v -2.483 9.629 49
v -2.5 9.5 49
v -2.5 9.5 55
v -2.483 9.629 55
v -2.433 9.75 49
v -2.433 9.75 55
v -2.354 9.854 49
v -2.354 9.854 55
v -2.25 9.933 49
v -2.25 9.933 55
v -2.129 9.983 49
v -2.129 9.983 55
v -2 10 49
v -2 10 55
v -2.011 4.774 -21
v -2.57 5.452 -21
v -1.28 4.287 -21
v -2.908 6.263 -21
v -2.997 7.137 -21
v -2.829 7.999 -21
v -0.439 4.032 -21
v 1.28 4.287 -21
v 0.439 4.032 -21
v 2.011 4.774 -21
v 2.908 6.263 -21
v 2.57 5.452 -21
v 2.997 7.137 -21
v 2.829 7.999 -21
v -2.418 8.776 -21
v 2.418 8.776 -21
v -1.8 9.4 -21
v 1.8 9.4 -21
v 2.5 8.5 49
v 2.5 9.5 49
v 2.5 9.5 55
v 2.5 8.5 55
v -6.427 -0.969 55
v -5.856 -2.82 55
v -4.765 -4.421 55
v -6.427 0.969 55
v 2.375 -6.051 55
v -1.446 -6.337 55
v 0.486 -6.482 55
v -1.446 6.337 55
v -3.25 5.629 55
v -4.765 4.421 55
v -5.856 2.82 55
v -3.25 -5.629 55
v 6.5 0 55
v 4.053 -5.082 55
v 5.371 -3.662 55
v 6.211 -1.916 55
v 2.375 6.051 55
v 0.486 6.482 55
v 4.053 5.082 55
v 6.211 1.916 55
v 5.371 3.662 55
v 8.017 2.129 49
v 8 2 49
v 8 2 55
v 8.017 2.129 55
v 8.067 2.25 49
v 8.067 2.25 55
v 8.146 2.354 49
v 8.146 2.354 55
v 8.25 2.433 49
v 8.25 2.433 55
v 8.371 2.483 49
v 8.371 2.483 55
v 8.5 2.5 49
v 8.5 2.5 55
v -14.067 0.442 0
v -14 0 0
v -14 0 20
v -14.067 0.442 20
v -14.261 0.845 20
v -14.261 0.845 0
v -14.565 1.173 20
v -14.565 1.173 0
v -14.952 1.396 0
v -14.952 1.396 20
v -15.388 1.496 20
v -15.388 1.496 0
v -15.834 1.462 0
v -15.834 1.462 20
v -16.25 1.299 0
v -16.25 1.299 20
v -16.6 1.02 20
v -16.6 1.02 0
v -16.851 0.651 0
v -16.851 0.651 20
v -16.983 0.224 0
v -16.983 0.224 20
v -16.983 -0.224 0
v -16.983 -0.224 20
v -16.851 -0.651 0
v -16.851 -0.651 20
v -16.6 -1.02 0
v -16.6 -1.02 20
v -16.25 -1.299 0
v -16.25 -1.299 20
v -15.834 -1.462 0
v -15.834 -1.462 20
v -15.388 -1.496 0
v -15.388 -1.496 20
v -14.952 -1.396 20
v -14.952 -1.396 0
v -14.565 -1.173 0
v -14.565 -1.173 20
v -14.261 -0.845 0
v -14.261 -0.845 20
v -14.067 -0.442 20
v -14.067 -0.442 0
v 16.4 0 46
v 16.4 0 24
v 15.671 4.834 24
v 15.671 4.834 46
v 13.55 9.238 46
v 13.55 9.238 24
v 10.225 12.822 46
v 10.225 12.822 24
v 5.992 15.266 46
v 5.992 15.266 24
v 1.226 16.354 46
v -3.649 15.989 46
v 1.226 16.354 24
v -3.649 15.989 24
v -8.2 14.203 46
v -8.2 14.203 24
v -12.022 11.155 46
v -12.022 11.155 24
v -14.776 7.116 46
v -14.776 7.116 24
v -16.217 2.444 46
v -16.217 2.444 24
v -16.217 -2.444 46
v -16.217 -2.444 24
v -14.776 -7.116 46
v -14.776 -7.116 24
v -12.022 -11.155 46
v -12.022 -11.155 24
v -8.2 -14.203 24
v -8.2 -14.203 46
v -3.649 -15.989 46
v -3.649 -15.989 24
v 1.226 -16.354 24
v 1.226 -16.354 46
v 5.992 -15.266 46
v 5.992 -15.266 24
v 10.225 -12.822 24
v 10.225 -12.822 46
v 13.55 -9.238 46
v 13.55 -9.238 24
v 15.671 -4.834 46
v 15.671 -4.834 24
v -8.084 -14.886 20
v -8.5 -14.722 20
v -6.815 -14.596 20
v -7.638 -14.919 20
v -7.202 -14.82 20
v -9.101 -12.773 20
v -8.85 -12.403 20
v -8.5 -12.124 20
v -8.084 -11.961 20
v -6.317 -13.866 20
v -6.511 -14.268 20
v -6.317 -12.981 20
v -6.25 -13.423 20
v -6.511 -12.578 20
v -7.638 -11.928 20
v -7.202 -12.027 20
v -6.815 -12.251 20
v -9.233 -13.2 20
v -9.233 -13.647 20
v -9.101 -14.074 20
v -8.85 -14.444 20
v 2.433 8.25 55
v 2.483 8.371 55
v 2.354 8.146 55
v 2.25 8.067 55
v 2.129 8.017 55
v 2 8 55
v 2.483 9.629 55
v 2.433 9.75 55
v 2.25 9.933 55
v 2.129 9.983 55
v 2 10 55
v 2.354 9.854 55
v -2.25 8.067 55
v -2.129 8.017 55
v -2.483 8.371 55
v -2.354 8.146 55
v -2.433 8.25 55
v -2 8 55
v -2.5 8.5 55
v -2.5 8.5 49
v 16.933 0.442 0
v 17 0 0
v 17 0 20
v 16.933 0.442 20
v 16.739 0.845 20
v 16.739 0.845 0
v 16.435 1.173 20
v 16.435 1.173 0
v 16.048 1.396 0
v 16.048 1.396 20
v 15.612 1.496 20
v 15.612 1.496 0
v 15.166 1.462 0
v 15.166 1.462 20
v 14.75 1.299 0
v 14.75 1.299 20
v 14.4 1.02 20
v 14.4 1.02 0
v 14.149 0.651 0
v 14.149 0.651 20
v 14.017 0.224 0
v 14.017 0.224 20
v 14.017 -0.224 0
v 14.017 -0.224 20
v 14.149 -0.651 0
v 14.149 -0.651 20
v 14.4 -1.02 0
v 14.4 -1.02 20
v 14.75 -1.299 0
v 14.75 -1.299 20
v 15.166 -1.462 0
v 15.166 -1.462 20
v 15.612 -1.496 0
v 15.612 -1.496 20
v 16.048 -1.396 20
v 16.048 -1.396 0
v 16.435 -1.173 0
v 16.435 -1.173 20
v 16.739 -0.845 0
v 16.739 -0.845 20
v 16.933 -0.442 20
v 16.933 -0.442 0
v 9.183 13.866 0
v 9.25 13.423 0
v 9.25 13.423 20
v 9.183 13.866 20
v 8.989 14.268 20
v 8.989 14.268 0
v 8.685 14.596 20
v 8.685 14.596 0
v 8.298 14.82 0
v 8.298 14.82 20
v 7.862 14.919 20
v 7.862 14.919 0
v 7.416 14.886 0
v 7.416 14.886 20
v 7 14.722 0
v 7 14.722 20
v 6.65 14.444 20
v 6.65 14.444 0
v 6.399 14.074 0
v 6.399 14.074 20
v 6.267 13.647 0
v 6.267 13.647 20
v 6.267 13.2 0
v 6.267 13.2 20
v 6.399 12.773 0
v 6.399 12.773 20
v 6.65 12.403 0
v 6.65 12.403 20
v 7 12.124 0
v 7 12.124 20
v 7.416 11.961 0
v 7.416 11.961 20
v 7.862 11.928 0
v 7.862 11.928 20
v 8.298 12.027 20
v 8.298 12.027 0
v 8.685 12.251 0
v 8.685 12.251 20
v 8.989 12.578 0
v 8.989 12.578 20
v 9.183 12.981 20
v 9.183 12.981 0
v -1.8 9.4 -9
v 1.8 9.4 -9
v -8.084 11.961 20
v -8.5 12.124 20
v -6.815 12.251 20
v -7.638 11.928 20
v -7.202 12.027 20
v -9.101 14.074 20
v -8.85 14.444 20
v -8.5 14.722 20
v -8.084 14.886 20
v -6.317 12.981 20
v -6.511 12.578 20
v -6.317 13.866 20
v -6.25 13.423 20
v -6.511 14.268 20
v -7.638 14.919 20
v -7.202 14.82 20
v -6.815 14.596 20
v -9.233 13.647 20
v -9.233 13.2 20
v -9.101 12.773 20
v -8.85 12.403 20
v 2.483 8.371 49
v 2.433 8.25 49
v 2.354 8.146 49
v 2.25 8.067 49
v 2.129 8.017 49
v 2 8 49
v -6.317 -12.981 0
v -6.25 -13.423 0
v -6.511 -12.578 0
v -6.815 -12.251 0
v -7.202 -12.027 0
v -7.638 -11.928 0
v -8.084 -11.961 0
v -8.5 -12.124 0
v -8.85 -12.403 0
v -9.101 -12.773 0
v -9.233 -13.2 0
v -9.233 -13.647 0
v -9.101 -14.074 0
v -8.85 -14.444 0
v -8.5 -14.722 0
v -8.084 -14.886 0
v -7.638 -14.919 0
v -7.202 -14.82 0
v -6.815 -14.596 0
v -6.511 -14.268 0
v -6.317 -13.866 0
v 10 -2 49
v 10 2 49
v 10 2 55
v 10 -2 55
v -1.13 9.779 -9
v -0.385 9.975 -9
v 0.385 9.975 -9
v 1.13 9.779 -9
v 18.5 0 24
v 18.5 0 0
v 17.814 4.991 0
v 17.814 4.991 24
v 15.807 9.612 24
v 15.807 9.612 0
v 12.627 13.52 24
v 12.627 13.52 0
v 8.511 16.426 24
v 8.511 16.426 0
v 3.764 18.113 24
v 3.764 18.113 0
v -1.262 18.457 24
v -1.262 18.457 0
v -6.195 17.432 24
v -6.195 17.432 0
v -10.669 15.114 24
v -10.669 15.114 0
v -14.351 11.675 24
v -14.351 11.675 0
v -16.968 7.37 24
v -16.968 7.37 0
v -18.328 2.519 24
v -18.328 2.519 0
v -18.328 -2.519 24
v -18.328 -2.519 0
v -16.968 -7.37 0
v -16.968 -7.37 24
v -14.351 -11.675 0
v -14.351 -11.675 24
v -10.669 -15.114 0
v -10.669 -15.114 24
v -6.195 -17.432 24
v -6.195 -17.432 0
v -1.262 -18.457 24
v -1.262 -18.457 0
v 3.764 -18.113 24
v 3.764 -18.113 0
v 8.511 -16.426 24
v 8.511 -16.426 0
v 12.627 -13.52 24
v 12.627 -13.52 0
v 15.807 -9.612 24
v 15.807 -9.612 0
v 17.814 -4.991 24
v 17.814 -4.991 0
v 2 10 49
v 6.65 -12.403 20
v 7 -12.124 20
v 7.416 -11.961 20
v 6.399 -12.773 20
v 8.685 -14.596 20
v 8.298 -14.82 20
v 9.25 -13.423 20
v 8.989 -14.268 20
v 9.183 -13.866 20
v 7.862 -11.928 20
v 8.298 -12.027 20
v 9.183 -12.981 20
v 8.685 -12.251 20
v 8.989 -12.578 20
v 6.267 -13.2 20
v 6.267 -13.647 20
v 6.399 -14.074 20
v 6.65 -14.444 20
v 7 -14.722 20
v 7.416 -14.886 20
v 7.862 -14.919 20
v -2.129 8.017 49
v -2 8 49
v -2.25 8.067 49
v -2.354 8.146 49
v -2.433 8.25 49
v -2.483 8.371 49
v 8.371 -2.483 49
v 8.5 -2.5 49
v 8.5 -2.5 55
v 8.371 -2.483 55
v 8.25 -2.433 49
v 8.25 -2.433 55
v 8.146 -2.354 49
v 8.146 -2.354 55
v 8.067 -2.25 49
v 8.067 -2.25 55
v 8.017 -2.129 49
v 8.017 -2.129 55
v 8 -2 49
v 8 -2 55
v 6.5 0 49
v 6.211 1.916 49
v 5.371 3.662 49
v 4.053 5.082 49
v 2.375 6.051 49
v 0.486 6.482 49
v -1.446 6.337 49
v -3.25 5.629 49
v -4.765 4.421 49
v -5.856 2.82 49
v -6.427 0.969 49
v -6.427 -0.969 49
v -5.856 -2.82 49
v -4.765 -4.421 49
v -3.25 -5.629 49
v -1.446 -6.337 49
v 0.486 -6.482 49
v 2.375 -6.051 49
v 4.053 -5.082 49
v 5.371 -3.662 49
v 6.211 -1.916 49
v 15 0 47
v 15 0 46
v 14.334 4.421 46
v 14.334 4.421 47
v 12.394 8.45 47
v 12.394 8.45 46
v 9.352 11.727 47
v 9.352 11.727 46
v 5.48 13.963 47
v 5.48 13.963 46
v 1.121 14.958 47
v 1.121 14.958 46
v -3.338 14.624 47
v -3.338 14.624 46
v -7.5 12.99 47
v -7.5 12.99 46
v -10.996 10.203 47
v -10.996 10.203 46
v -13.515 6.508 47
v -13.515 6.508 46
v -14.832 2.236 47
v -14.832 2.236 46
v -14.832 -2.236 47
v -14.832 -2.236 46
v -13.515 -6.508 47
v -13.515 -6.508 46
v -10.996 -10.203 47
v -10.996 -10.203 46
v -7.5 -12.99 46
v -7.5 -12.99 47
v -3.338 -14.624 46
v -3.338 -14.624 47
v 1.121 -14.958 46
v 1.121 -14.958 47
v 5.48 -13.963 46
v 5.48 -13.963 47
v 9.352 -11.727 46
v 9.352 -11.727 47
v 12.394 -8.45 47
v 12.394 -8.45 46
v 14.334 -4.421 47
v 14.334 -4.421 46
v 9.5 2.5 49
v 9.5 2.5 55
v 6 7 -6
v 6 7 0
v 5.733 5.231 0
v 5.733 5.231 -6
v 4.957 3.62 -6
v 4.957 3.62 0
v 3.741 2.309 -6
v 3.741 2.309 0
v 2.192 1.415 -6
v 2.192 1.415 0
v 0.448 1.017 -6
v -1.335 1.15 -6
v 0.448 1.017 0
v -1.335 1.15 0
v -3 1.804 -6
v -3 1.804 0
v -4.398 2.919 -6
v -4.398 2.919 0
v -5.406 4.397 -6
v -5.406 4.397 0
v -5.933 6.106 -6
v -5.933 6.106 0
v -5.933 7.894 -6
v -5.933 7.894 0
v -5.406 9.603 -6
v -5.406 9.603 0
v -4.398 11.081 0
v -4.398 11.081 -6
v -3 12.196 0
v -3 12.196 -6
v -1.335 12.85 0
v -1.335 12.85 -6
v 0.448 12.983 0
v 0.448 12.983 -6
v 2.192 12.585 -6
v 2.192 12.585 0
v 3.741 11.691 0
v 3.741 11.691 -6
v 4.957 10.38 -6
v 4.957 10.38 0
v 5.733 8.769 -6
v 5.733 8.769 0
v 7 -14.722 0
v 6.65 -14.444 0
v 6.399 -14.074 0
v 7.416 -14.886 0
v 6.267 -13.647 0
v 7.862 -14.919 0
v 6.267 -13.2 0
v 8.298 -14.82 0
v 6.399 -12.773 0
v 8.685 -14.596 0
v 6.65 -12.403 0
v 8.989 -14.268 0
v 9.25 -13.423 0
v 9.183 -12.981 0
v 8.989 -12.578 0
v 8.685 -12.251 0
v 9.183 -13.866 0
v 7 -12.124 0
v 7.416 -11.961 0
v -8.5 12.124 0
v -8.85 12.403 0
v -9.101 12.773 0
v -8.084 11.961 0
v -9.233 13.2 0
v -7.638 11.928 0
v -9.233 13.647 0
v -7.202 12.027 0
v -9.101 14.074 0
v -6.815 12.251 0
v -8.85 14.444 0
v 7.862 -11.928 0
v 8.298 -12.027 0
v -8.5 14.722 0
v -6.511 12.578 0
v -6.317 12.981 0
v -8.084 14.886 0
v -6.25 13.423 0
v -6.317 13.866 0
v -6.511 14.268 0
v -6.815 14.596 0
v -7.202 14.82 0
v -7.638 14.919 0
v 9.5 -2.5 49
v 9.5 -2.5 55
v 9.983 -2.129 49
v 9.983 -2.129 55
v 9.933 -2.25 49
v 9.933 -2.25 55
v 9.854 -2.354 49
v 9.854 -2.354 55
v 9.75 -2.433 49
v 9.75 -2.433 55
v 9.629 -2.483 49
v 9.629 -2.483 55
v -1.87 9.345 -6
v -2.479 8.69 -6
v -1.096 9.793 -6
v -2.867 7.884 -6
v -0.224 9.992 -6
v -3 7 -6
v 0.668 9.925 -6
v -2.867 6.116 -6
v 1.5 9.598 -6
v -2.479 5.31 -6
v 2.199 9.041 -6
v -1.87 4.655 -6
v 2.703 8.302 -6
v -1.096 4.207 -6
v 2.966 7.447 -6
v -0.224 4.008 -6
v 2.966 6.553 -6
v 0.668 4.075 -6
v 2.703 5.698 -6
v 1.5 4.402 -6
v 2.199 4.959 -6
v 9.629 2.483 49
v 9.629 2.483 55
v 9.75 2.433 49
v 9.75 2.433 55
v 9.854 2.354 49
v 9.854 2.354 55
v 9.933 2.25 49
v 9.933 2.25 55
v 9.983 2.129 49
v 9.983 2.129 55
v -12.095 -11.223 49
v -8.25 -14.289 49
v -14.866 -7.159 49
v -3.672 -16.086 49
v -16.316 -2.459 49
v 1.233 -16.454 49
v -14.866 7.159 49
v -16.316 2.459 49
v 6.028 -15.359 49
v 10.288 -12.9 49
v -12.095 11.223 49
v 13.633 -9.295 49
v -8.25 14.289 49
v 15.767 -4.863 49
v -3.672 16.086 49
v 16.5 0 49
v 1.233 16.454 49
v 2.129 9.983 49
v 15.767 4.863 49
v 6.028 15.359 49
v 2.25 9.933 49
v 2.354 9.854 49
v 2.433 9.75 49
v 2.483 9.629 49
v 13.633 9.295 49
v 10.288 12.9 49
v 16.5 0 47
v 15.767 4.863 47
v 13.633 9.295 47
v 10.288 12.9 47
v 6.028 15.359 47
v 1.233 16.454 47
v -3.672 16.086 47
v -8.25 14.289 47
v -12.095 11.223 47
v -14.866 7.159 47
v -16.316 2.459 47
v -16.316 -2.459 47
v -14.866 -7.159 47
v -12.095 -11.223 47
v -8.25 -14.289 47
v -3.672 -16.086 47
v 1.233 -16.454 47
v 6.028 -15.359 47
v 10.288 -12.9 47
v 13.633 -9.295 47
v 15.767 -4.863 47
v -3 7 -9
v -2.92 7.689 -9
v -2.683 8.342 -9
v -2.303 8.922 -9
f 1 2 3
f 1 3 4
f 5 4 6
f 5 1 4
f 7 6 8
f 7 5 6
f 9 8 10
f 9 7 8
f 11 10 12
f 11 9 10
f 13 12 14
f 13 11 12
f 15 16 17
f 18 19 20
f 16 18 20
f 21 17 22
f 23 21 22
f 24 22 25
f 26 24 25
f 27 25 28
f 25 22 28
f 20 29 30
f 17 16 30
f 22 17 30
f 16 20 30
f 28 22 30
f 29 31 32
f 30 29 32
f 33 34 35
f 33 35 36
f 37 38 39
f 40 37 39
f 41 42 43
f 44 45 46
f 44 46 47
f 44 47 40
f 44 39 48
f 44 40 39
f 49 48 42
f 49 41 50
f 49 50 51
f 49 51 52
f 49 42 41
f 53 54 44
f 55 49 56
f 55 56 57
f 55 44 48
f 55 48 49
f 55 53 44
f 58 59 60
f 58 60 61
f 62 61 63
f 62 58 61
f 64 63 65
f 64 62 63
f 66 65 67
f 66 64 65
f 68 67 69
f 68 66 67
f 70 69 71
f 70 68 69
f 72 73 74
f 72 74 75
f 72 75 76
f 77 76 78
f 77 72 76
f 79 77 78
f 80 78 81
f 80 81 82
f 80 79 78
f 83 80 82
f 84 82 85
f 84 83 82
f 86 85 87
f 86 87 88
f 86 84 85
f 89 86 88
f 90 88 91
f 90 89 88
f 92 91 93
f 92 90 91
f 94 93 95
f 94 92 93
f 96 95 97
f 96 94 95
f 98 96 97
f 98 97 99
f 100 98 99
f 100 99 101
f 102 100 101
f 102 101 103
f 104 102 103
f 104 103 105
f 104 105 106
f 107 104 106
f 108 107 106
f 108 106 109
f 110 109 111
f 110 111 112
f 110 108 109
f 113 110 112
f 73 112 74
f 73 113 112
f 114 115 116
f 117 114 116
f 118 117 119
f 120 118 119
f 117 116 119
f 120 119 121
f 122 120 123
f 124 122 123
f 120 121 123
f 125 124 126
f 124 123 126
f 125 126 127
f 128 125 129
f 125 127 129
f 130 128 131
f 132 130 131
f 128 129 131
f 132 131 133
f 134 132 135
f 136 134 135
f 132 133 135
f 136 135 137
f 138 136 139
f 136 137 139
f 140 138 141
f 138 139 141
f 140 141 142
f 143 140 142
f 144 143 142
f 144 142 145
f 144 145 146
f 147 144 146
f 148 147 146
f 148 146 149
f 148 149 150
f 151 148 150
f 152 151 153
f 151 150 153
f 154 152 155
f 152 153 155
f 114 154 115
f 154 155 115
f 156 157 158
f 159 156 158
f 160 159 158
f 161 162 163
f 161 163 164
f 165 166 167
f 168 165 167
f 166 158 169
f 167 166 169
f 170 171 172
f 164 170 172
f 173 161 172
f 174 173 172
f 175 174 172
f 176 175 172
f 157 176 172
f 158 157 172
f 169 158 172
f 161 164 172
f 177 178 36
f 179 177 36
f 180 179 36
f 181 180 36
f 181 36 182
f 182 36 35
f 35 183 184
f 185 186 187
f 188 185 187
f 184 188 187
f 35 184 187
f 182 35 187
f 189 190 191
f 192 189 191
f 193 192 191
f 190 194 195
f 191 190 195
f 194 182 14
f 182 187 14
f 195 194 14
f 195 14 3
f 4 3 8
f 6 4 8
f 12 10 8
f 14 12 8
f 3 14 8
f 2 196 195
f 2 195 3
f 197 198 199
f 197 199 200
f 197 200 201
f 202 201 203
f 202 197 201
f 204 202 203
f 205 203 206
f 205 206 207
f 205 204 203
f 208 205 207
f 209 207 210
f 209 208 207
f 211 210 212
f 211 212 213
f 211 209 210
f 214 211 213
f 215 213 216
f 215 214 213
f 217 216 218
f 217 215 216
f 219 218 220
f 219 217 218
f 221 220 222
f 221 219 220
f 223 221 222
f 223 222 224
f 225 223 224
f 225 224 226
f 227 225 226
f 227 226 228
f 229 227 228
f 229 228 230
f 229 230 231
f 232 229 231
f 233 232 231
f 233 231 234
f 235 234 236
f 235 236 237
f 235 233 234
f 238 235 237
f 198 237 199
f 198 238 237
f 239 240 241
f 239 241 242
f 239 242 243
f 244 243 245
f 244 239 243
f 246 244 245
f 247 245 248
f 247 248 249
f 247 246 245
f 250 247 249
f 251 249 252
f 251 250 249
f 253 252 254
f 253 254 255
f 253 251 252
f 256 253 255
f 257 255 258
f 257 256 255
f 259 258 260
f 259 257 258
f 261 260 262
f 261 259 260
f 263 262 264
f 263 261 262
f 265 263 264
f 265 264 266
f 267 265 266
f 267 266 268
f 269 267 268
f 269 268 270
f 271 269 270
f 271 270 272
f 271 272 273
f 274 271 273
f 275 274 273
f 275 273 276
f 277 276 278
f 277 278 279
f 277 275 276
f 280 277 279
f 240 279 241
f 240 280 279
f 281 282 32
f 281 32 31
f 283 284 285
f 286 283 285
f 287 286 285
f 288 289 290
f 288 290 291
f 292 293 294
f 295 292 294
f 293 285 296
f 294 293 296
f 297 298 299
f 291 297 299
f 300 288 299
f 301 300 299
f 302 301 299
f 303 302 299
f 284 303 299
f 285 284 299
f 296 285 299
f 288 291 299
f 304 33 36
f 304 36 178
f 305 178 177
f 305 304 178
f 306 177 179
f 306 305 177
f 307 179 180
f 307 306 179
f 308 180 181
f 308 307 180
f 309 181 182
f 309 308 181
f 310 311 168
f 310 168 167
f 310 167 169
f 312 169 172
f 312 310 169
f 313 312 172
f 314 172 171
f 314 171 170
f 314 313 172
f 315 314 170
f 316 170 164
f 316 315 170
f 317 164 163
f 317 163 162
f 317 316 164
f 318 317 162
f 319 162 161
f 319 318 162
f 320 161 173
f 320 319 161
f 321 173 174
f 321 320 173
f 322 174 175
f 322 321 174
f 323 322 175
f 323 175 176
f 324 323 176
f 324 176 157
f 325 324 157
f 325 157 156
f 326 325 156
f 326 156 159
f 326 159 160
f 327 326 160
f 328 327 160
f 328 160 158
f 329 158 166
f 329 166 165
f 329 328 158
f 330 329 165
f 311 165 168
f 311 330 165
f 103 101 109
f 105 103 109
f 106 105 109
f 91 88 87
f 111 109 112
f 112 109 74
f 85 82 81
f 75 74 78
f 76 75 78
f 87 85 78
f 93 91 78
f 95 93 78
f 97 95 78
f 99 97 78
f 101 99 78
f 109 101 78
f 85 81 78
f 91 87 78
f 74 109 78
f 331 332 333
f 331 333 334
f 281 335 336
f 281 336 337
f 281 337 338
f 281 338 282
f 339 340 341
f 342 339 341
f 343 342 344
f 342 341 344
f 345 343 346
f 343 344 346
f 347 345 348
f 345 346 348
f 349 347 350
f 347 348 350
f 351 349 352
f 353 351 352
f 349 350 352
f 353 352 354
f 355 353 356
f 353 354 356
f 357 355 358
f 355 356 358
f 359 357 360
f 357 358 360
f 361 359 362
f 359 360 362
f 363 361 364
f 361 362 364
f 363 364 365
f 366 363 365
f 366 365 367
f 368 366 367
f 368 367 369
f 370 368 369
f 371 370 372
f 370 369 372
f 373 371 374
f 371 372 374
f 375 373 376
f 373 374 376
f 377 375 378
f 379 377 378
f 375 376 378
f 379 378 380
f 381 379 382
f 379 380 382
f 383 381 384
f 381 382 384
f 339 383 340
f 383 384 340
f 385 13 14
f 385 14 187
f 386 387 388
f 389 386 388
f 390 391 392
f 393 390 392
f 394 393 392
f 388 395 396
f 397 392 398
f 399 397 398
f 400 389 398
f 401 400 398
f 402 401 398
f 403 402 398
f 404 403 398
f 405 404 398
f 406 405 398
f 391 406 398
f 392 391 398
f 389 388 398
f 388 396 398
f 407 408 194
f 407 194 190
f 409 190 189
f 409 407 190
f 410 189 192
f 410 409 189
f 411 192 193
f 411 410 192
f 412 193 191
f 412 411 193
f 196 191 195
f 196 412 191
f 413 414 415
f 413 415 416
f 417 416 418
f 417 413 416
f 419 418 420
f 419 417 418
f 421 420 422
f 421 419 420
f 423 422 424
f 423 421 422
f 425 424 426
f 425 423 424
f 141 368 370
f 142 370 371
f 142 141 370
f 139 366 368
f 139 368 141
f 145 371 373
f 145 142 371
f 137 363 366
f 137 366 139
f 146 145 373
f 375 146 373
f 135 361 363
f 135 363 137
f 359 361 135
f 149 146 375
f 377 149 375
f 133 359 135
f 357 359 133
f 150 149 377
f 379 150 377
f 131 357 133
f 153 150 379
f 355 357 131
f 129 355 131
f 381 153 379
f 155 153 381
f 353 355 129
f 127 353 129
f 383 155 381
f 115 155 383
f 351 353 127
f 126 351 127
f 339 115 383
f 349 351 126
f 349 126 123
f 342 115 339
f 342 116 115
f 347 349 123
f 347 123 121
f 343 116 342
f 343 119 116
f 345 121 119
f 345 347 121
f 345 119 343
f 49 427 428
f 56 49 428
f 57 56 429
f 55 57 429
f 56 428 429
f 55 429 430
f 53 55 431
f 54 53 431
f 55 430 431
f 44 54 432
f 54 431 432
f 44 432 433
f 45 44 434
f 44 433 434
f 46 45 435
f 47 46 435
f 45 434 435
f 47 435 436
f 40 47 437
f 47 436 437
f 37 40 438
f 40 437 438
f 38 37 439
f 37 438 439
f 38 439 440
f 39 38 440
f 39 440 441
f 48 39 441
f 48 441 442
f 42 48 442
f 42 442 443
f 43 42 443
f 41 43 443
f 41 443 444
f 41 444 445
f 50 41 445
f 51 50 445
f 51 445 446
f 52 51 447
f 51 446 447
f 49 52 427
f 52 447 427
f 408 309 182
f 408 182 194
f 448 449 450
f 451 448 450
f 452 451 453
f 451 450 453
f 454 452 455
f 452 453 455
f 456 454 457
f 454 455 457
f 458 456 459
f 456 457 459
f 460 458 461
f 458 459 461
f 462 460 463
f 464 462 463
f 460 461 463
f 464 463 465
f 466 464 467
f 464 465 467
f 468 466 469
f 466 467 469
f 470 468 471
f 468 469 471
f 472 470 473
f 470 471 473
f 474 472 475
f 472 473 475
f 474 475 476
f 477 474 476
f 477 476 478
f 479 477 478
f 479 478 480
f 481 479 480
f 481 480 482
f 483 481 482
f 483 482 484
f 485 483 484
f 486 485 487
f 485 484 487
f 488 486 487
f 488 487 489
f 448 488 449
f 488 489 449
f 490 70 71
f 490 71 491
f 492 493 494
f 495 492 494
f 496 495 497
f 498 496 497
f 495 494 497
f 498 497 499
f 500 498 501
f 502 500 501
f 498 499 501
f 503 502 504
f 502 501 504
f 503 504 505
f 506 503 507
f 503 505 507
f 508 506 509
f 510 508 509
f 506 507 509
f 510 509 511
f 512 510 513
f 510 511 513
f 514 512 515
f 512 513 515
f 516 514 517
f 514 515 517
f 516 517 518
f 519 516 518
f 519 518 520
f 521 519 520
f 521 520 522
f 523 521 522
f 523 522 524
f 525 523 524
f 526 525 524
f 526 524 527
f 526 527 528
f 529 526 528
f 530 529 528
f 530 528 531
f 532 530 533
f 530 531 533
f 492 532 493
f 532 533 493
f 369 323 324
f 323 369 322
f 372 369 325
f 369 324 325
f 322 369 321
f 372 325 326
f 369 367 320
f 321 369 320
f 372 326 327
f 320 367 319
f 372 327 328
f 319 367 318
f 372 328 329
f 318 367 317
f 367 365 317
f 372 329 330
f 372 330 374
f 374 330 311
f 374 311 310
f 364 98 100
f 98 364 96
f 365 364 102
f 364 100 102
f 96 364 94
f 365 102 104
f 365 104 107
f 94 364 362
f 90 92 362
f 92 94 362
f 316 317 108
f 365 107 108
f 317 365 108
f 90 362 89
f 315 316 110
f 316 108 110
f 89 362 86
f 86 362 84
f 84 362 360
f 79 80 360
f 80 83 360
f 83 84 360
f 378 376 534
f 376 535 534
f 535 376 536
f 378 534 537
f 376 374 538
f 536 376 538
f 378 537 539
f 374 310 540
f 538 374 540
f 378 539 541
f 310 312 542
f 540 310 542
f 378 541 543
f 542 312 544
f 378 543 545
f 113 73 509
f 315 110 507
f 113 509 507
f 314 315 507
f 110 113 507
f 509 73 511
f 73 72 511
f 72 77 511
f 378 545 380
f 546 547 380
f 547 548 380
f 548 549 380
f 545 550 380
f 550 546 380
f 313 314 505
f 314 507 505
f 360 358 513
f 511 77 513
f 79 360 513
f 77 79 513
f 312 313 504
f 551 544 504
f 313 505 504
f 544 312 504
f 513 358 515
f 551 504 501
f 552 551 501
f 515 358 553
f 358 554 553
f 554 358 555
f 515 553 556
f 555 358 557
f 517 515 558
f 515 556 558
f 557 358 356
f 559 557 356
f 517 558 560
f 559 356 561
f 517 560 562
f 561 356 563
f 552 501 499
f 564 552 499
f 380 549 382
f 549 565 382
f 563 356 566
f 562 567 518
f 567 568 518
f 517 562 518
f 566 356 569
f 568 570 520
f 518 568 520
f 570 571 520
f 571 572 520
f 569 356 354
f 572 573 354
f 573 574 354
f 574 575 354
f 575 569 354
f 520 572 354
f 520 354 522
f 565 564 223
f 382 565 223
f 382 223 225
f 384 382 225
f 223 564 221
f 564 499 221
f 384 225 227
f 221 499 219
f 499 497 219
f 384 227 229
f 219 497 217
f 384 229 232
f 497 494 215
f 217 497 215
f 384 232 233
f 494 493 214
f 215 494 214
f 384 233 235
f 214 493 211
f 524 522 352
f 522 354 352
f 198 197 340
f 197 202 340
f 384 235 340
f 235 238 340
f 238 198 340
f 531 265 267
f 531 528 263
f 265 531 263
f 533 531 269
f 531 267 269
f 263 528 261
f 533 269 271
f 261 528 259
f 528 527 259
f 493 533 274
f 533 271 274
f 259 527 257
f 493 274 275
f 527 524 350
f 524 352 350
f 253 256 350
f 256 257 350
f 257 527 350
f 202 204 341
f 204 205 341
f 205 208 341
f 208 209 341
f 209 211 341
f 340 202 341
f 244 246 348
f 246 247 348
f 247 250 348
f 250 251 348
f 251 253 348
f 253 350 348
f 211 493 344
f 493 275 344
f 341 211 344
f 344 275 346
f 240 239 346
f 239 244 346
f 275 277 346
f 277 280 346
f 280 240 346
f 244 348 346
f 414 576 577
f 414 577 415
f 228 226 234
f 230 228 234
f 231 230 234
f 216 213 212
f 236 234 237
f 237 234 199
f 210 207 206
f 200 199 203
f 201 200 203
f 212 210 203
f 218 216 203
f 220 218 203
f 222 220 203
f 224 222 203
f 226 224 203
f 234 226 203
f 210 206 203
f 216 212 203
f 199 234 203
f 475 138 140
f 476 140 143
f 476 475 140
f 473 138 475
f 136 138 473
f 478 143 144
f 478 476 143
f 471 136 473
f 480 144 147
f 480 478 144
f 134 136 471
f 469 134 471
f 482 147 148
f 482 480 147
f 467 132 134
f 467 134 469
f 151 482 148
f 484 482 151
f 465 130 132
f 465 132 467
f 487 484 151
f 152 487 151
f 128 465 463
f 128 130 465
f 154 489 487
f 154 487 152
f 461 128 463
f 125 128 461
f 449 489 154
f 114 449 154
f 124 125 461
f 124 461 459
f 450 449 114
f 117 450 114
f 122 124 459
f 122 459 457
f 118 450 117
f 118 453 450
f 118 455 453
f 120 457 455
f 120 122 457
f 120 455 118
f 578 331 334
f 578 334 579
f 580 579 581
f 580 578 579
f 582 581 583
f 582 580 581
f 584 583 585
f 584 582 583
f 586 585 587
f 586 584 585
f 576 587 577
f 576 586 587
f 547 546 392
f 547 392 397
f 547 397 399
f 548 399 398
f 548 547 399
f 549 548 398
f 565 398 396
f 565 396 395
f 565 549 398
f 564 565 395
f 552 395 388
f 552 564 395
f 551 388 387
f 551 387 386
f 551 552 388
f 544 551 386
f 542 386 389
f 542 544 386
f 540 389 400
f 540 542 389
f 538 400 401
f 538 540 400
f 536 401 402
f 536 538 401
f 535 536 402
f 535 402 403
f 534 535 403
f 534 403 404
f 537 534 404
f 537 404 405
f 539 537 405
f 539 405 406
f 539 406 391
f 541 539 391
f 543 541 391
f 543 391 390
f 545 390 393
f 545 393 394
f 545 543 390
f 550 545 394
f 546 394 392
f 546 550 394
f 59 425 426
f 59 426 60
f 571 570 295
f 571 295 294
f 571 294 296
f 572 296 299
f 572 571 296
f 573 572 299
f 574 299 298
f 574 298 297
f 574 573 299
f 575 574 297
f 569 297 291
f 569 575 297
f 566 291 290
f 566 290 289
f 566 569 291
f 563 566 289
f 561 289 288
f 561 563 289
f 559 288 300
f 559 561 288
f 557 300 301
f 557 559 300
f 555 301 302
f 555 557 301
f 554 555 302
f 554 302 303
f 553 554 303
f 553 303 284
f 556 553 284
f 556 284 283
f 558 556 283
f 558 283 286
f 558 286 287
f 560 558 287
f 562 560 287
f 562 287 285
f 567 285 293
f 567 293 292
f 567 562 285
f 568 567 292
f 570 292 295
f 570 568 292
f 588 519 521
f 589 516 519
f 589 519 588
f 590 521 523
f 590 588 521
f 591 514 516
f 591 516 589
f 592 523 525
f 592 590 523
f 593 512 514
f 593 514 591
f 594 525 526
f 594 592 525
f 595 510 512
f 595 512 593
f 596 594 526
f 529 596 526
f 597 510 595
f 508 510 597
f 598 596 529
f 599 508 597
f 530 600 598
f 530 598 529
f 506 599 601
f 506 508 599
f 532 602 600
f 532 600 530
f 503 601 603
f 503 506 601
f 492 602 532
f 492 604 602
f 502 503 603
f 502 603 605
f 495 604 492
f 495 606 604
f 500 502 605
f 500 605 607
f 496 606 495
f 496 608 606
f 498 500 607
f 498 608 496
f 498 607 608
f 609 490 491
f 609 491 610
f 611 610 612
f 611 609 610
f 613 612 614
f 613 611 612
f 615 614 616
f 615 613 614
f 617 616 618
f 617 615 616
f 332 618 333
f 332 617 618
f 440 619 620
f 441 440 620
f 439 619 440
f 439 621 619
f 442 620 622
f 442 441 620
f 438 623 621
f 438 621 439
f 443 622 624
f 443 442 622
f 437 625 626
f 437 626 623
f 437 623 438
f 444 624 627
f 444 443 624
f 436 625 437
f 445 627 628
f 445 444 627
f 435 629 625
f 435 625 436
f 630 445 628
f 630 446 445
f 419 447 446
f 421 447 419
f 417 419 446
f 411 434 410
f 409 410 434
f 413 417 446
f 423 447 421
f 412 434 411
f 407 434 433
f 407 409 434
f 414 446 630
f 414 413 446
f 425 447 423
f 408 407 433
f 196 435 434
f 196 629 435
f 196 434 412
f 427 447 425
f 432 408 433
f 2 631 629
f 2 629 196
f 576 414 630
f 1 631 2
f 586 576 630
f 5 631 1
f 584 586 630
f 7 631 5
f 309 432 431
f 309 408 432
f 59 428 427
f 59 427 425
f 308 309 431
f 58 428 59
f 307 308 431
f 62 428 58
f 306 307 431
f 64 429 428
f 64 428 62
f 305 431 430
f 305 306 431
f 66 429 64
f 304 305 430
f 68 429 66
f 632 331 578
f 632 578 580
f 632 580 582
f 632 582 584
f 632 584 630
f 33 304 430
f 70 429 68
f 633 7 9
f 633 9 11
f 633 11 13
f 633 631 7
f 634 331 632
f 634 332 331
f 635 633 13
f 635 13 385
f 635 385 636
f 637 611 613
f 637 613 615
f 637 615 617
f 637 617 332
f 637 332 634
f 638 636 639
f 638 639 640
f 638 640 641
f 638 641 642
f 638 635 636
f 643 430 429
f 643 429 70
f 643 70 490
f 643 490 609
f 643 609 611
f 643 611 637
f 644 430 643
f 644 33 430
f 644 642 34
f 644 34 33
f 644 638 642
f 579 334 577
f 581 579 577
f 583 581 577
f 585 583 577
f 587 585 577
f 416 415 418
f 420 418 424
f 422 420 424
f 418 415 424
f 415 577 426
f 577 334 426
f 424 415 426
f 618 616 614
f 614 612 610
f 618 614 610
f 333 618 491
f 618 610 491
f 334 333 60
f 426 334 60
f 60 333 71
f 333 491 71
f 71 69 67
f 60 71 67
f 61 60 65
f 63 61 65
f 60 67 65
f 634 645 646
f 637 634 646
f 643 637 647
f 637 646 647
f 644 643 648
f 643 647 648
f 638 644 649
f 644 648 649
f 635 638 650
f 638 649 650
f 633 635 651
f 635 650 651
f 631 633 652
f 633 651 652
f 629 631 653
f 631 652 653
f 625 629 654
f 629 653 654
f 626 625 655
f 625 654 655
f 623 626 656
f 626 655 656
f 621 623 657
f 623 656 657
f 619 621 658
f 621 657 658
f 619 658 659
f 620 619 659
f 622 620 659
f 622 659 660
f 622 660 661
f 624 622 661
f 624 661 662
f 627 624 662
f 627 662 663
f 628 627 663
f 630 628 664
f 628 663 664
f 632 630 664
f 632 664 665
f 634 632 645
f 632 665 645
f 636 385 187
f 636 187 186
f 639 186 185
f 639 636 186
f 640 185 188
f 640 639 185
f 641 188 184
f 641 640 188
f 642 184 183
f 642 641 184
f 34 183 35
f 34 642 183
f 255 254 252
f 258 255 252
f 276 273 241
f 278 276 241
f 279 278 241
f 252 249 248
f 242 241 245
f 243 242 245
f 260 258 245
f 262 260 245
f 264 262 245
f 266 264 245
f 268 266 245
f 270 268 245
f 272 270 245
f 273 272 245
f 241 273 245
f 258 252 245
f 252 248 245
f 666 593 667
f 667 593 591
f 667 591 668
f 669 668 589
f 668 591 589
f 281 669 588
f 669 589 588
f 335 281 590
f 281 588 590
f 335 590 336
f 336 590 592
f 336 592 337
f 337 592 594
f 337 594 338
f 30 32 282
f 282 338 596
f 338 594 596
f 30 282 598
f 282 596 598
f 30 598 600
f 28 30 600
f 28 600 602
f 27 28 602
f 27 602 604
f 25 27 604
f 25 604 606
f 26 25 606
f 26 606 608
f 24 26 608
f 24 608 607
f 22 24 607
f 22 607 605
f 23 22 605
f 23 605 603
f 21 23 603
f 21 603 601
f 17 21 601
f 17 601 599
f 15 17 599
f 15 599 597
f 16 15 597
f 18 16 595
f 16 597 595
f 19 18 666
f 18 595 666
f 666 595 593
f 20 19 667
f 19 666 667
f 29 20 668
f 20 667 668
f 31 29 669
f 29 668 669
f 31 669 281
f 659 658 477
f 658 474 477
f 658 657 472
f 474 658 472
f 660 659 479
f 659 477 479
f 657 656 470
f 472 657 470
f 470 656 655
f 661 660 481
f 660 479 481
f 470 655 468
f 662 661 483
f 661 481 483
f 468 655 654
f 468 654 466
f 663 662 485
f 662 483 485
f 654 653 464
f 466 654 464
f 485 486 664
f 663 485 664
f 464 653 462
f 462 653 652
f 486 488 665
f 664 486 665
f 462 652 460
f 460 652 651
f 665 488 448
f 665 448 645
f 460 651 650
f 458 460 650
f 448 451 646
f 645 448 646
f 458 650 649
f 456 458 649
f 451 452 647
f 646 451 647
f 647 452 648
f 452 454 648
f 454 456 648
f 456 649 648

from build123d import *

# Parameters (mm, degrees)
SKETCH_1_R          = 18.5
EXTRUDE_1_DEPTH     = 24
SKETCH_1_3_R        = 1.5
CUT_EXTRUDE_1_DEPTH = 20
SKETCH_3_R          = 16.4
EXTRUDE_3_DEPTH     = 22
SKETCH_4_R          = 6
EXTRUDE_4_DEPTH     = 6
SKETCH_5_R          = 3
EXTRUDE_5_DEPTH     = 3
EXTRUDE_6_DEPTH     = 12
SKETCH_7_R          = 15
EXTRUDE_7_DEPTH     = 1
SKETCH_8_R          = 16.5
EXTRUDE_8_DEPTH     = 2
SKETCH_9_R          = 6.5
EXTRUDE_9_DEPTH     = 6


with BuildPart() as part:
    # 草图1 → 凸台-拉伸1 (new body)
    with BuildSketch(Plane.XY):
        Circle(SKETCH_1_R)
    extrude(amount=EXTRUDE_1_DEPTH)

    # 草图1<3> → 切除-拉伸1 (cut)
    with BuildSketch(Plane.XY):
        with Locations((-15.5, 0)):
            Circle(SKETCH_1_3_R)
        with Locations((-7.75, 13.423393759)):
            Circle(SKETCH_1_3_R)
        with Locations((-7.75, -13.423393759)):
            Circle(SKETCH_1_3_R)
        with Locations((7.75, 13.423393759)):
            Circle(SKETCH_1_3_R)
        with Locations((15.5, 0)):
            Circle(SKETCH_1_3_R)
        with Locations((7.75, -13.423393759)):
            Circle(SKETCH_1_3_R)
    extrude(amount=CUT_EXTRUDE_1_DEPTH, mode=Mode.SUBTRACT)

    # 草图3 → 凸台-拉伸3 (add)
    with BuildSketch(Plane.XY.offset(24)):
        Circle(SKETCH_3_R)
    extrude(amount=EXTRUDE_3_DEPTH)

    # 草图4 → 凸台-拉伸4 (add)
    with BuildSketch(Plane(origin=(0, 0, 0), x_dir=(-1, 0, 0), z_dir=(0, 0, -1))):
        with Locations(Location((0, 7, 0), (0, 0, 180))):
            Circle(SKETCH_4_R)
    extrude(amount=EXTRUDE_4_DEPTH)

    # 草图5 → 凸台-拉伸5 (add)
    with BuildSketch(Plane(origin=(0, 0, -6), x_dir=(-1, 0, 0), z_dir=(0, 0, -1))):
        with Locations((0, 7)):
            Circle(SKETCH_5_R)
    extrude(amount=EXTRUDE_5_DEPTH)

    # 草图6 → 凸台-拉伸6 (add)
    with BuildSketch(Plane(origin=(0, 0, -9), x_dir=(-1, 0, 0), z_dir=(0, 0, -1))):
        with BuildLine():
            Line((-1.8, 9.4), (1.8, 9.4))
            ThreePointArc((1.8, 9.4), (0, 4), (-1.8, 9.4))
        make_face()
    extrude(amount=EXTRUDE_6_DEPTH)

    # 草图7 → 凸台-拉伸7 (add)
    with BuildSketch(Plane.XY.offset(46)):
        Circle(SKETCH_7_R)
    extrude(amount=EXTRUDE_7_DEPTH)

    # 草图8 → 凸台-拉伸8 (add)
    with BuildSketch(Plane.XY.offset(47)):
        Circle(SKETCH_8_R)
    extrude(amount=EXTRUDE_8_DEPTH)

    # 草图9 → 凸台-拉伸9 (add)
    with BuildSketch(Plane.XY.offset(49)):
        Circle(SKETCH_9_R)
        with BuildLine():
            Line((-2, 10), (2, 10))
            ThreePointArc((2, 10), (2.353553391, 9.853553391), (2.5, 9.5))
            Line((2.5, 9.5), (2.5, 8.5))
            ThreePointArc((2.5, 8.5), (2.353553391, 8.146446609), (2, 8))
            Line((2, 8), (-2, 8))
            ThreePointArc((-2, 8), (-2.353553391, 8.146446609), (-2.5, 8.5))
            Line((-2.5, 8.5), (-2.5, 9.5))
            ThreePointArc((-2.5, 9.5), (-2.353553391, 9.853553391), (-2, 10))
        make_face()
        with BuildLine():
            Line((8.5, 2.5), (9.5, 2.5))
            ThreePointArc((9.5, 2.5), (9.853553391, 2.353553391), (10, 2))
            Line((10, 2), (10, -2))
            ThreePointArc((10, -2), (9.853553391, -2.353553391), (9.5, -2.5))
            Line((9.5, -2.5), (8.5, -2.5))
            ThreePointArc((8.5, -2.5), (8.146446609, -2.353553391), (8, -2))
            Line((8, -2), (8, 2))
            ThreePointArc((8, 2), (8.146446609, 2.353553391), (8.5, 2.5))
        make_face()
    extrude(amount=EXTRUDE_9_DEPTH)


solid = part.part
